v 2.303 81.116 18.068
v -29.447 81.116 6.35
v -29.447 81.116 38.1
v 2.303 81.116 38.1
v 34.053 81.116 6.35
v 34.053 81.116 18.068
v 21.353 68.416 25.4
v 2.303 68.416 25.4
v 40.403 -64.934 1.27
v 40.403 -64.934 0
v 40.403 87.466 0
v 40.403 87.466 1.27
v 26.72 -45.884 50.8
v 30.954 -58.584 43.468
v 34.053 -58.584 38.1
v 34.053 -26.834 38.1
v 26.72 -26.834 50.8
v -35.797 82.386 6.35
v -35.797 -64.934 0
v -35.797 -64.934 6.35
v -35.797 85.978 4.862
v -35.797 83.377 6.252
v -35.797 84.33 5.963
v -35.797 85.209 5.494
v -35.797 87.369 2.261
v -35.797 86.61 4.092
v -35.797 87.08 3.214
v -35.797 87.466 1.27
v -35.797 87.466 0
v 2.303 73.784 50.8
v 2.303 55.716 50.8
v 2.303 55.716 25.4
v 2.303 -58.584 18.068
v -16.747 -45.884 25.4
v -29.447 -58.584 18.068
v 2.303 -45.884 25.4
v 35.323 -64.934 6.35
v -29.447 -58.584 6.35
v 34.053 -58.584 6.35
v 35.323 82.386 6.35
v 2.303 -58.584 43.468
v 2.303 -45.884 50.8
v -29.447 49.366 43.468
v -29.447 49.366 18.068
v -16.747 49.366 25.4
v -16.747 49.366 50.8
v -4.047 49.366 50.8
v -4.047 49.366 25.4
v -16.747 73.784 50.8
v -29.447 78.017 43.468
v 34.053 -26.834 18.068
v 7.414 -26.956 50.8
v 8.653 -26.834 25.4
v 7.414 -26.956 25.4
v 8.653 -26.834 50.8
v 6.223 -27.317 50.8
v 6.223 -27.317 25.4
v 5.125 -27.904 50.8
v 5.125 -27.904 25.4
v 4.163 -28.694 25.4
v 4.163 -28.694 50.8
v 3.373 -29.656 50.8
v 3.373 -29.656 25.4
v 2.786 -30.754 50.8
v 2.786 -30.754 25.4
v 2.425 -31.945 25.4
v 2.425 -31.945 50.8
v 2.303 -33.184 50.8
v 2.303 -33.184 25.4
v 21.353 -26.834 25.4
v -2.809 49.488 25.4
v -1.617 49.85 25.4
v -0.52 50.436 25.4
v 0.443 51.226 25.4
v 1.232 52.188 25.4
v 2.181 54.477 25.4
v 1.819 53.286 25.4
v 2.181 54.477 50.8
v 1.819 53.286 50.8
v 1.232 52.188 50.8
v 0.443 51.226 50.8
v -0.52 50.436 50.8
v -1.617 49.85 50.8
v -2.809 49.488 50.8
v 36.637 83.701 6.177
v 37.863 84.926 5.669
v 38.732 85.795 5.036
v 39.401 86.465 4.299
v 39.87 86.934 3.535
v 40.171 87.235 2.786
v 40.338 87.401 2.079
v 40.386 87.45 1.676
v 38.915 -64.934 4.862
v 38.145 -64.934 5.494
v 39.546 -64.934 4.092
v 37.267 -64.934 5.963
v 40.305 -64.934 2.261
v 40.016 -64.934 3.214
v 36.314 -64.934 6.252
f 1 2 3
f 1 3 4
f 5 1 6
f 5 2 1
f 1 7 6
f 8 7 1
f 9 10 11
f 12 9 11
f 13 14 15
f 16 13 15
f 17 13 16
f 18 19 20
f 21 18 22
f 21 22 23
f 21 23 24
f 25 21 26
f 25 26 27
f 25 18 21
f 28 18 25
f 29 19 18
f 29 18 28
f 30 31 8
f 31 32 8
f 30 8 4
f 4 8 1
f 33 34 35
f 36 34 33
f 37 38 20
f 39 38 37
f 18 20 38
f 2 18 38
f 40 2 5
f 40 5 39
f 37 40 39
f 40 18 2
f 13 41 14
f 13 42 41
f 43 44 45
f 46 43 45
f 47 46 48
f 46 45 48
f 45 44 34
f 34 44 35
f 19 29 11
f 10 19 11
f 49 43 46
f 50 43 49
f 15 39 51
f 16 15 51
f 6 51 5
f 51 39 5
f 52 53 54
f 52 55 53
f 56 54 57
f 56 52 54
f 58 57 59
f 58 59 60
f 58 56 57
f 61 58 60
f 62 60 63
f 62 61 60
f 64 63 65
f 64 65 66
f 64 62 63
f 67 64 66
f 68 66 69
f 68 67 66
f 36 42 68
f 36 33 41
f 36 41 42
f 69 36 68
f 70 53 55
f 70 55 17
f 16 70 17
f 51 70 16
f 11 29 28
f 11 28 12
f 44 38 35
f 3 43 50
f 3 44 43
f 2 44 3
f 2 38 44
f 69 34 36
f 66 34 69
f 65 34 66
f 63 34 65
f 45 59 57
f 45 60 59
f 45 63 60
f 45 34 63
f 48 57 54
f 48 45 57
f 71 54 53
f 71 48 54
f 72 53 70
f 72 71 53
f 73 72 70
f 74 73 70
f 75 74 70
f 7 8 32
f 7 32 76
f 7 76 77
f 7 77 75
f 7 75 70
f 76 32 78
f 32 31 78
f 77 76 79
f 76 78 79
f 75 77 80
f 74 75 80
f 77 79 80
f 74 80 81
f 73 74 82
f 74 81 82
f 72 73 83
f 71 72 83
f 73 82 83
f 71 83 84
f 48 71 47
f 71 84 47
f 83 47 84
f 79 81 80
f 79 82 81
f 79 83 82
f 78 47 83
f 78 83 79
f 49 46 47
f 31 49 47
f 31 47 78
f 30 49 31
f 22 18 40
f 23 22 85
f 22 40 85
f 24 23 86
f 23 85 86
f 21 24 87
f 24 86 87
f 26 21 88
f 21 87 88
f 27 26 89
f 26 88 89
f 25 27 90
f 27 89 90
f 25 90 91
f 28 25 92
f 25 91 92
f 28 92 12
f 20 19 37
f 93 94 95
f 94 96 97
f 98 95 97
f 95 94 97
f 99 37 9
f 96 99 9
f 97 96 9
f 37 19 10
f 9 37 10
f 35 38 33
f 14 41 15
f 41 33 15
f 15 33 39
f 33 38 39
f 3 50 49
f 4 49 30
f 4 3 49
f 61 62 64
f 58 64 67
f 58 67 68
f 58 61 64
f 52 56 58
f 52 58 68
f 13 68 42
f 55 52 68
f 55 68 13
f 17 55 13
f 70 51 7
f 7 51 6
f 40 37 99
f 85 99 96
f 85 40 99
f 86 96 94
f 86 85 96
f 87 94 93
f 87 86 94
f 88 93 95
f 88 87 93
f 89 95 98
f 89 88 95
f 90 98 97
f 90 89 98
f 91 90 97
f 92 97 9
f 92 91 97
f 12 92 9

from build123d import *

# Parameters (mm, degrees)
F0_W        = 76.2
F0_H        = 152.4
F1_DEPTH    = 6.35
F2_DEPTH    = 25.4
F0_W_2      = 31.75
F0_H_2      = 31.75
F3_DEPTH    = 50.8
F4_C1_SIZE2 = 12.7
F4_C1_SIZE  = 7.3323484187
F4_C2_SIZE2 = 12.7
F4_C2_SIZE  = 7.3323484187
F4_C3_SIZE2 = 7.3323484187
F4_C3_SIZE  = 12.7
F4_C4_SIZE2 = 12.7
F4_C4_SIZE  = 7.3323484187
F4_C5_SIZE2 = 7.3323484187
F4_C5_SIZE  = 12.7
F4_C6_SIZE2 = 7.3323484187
F4_C6_SIZE  = 12.7
F4_C7_SIZE2 = 7.3323484187
F4_C7_SIZE  = 12.7
F4_C8_SIZE2 = 12.7
F4_C8_SIZE  = 7.3323484187
F5_R        = 6.35
F6_R        = 5.08


with BuildPart() as f1:
    # F0 (on Top) → F1 (new body)
    with BuildSketch(Plane.XY):
        with Locations((2.3026284762, 11.2662552908)):
            Rectangle(F0_W, F0_H)
        Polygon((-29.4473715238, 49.3662552908), (-29.4473715238, 81.1162552908), (2.3026284762, 81.1162552908), (34.0526284762, 81.1162552908), (34.0526284762, -26.8337447092), (34.0526284762, -58.5837447092), (2.3026284762, -58.5837447092), (-29.4473715238, -58.5837447092), align=None, mode=Mode.SUBTRACT)
    extrude(amount=F1_DEPTH)

    # F0 (on Top) → F2 (join)
    with BuildSketch(Plane.XY):
        Polygon((34.0526284762, 81.1162552908), (2.3026284762, 81.1162552908), (2.3026284762, 49.3662552908), (-29.4473715238, 49.3662552908), (-29.4473715238, -58.5837447092), (2.3026284762, -58.5837447092), (2.3026284762, -26.8337447092), (34.0526284762, -26.8337447092), align=None)
    extrude(amount=F2_DEPTH)

    # F0 (on Top) → F3 (join)
    with BuildSketch(Plane.XY):
        with Locations((-13.5723715238, 65.2412552908)):
            Rectangle(F0_W_2, F0_H_2)
        with Locations((18.1776284762, -42.7087447092)):
            Rectangle(F0_W_2, F0_H_2)
    extrude(amount=F3_DEPTH)

    # F4: chamfer of 12.7 x 7.3323484187 on 8 edges, made by hand

    # F4_c1
    f4_c1_edges = [f1.edges().sort_by_distance(p)[0] for p in [
        (-13.5723715238, -58.5837447092, 25.4),
    ]]
    f4_c1_side = f1.faces().sort_by_distance((-13.5723715238, -58.5837447092, 25.2533530316))[0]
    chamfer(f4_c1_edges, length=F4_C1_SIZE, length2=F4_C1_SIZE2, reference=f4_c1_side)

    # F4_c2
    f4_c2_edges = [f1.edges().sort_by_distance(p)[0] for p in [
        (18.1776284762, -58.5837447092, 50.8),
    ]]
    f4_c2_side = f1.faces().sort_by_distance((18.1776284762, -58.5837447092, 50.6533530316))[0]
    chamfer(f4_c2_edges, length=F4_C2_SIZE, length2=F4_C2_SIZE2, reference=f4_c2_side)

    # F4_c3
    f4_c3_edges = [f1.edges().sort_by_distance(p)[0] for p in [
        (34.0526284762, -36.3587447092, 50.8),
    ]]
    f4_c3_side = f1.faces().sort_by_distance((34.0526284762, -36.3587447092, 50.6533530316))[0]
    chamfer(f4_c3_edges, length=F4_C3_SIZE, length2=F4_C3_SIZE2, reference=f4_c3_side)

    # F4_c4
    f4_c4_edges = [f1.edges().sort_by_distance(p)[0] for p in [
        (18.1776284762, 81.1162552908, 25.4),
    ]]
    f4_c4_side = f1.faces().sort_by_distance((18.1776284762, 81.1162552908, 25.2533530316))[0]
    chamfer(f4_c4_edges, length=F4_C4_SIZE, length2=F4_C4_SIZE2, reference=f4_c4_side)

    # F4_c5
    f4_c5_edges = [f1.edges().sort_by_distance(p)[0] for p in [
        (-29.4473715238, 1.7412552908, 25.4),
    ]]
    f4_c5_side = f1.faces().sort_by_distance((-29.3007245555, 1.7412552908, 25.4))[0]
    chamfer(f4_c5_edges, length=F4_C5_SIZE, length2=F4_C5_SIZE2, reference=f4_c5_side)

    # F4_c6
    f4_c6_edges = [f1.edges().sort_by_distance(p)[0] for p in [
        (34.0526284762, 20.7912552908, 25.4),
    ]]
    f4_c6_side = f1.faces().sort_by_distance((33.9059815078, 20.7912552908, 25.4))[0]
    chamfer(f4_c6_edges, length=F4_C6_SIZE, length2=F4_C6_SIZE2, reference=f4_c6_side)

    # F4_c7
    f4_c7_edges = [f1.edges().sort_by_distance(p)[0] for p in [
        (-29.4473715238, 65.2412552908, 50.8),
    ]]
    f4_c7_side = f1.faces().sort_by_distance((-29.3007245555, 65.2412552908, 50.8))[0]
    chamfer(f4_c7_edges, length=F4_C7_SIZE, length2=F4_C7_SIZE2, reference=f4_c7_side)

    # F4_c8
    f4_c8_edges = [f1.edges().sort_by_distance(p)[0] for p in [
        (-7.2223715238, 81.1162552908, 50.8),
    ]]
    f4_c8_side = f1.faces().sort_by_distance((-7.2223715238, 80.9696083224, 50.8))[0]
    chamfer(f4_c8_edges, length=F4_C8_SIZE, length2=F4_C8_SIZE2, reference=f4_c8_side)

    # F5
    f5_edges = [f1.edges().sort_by_distance(p)[0] for p in [
        (2.302628, 49.366255, 38.1),
        (2.302628, -26.833745, 38.1),
    ]]
    fillet(f5_edges, radius=F5_R)

    # F6
    f6_edges = [f1.edges().sort_by_distance(p)[0] for p in [
        (2.302628, 87.466255, 6.35),
        (40.402628, 11.266255, 6.35),
    ]]
    fillet(f6_edges, radius=F6_R)


solid = f1.part
